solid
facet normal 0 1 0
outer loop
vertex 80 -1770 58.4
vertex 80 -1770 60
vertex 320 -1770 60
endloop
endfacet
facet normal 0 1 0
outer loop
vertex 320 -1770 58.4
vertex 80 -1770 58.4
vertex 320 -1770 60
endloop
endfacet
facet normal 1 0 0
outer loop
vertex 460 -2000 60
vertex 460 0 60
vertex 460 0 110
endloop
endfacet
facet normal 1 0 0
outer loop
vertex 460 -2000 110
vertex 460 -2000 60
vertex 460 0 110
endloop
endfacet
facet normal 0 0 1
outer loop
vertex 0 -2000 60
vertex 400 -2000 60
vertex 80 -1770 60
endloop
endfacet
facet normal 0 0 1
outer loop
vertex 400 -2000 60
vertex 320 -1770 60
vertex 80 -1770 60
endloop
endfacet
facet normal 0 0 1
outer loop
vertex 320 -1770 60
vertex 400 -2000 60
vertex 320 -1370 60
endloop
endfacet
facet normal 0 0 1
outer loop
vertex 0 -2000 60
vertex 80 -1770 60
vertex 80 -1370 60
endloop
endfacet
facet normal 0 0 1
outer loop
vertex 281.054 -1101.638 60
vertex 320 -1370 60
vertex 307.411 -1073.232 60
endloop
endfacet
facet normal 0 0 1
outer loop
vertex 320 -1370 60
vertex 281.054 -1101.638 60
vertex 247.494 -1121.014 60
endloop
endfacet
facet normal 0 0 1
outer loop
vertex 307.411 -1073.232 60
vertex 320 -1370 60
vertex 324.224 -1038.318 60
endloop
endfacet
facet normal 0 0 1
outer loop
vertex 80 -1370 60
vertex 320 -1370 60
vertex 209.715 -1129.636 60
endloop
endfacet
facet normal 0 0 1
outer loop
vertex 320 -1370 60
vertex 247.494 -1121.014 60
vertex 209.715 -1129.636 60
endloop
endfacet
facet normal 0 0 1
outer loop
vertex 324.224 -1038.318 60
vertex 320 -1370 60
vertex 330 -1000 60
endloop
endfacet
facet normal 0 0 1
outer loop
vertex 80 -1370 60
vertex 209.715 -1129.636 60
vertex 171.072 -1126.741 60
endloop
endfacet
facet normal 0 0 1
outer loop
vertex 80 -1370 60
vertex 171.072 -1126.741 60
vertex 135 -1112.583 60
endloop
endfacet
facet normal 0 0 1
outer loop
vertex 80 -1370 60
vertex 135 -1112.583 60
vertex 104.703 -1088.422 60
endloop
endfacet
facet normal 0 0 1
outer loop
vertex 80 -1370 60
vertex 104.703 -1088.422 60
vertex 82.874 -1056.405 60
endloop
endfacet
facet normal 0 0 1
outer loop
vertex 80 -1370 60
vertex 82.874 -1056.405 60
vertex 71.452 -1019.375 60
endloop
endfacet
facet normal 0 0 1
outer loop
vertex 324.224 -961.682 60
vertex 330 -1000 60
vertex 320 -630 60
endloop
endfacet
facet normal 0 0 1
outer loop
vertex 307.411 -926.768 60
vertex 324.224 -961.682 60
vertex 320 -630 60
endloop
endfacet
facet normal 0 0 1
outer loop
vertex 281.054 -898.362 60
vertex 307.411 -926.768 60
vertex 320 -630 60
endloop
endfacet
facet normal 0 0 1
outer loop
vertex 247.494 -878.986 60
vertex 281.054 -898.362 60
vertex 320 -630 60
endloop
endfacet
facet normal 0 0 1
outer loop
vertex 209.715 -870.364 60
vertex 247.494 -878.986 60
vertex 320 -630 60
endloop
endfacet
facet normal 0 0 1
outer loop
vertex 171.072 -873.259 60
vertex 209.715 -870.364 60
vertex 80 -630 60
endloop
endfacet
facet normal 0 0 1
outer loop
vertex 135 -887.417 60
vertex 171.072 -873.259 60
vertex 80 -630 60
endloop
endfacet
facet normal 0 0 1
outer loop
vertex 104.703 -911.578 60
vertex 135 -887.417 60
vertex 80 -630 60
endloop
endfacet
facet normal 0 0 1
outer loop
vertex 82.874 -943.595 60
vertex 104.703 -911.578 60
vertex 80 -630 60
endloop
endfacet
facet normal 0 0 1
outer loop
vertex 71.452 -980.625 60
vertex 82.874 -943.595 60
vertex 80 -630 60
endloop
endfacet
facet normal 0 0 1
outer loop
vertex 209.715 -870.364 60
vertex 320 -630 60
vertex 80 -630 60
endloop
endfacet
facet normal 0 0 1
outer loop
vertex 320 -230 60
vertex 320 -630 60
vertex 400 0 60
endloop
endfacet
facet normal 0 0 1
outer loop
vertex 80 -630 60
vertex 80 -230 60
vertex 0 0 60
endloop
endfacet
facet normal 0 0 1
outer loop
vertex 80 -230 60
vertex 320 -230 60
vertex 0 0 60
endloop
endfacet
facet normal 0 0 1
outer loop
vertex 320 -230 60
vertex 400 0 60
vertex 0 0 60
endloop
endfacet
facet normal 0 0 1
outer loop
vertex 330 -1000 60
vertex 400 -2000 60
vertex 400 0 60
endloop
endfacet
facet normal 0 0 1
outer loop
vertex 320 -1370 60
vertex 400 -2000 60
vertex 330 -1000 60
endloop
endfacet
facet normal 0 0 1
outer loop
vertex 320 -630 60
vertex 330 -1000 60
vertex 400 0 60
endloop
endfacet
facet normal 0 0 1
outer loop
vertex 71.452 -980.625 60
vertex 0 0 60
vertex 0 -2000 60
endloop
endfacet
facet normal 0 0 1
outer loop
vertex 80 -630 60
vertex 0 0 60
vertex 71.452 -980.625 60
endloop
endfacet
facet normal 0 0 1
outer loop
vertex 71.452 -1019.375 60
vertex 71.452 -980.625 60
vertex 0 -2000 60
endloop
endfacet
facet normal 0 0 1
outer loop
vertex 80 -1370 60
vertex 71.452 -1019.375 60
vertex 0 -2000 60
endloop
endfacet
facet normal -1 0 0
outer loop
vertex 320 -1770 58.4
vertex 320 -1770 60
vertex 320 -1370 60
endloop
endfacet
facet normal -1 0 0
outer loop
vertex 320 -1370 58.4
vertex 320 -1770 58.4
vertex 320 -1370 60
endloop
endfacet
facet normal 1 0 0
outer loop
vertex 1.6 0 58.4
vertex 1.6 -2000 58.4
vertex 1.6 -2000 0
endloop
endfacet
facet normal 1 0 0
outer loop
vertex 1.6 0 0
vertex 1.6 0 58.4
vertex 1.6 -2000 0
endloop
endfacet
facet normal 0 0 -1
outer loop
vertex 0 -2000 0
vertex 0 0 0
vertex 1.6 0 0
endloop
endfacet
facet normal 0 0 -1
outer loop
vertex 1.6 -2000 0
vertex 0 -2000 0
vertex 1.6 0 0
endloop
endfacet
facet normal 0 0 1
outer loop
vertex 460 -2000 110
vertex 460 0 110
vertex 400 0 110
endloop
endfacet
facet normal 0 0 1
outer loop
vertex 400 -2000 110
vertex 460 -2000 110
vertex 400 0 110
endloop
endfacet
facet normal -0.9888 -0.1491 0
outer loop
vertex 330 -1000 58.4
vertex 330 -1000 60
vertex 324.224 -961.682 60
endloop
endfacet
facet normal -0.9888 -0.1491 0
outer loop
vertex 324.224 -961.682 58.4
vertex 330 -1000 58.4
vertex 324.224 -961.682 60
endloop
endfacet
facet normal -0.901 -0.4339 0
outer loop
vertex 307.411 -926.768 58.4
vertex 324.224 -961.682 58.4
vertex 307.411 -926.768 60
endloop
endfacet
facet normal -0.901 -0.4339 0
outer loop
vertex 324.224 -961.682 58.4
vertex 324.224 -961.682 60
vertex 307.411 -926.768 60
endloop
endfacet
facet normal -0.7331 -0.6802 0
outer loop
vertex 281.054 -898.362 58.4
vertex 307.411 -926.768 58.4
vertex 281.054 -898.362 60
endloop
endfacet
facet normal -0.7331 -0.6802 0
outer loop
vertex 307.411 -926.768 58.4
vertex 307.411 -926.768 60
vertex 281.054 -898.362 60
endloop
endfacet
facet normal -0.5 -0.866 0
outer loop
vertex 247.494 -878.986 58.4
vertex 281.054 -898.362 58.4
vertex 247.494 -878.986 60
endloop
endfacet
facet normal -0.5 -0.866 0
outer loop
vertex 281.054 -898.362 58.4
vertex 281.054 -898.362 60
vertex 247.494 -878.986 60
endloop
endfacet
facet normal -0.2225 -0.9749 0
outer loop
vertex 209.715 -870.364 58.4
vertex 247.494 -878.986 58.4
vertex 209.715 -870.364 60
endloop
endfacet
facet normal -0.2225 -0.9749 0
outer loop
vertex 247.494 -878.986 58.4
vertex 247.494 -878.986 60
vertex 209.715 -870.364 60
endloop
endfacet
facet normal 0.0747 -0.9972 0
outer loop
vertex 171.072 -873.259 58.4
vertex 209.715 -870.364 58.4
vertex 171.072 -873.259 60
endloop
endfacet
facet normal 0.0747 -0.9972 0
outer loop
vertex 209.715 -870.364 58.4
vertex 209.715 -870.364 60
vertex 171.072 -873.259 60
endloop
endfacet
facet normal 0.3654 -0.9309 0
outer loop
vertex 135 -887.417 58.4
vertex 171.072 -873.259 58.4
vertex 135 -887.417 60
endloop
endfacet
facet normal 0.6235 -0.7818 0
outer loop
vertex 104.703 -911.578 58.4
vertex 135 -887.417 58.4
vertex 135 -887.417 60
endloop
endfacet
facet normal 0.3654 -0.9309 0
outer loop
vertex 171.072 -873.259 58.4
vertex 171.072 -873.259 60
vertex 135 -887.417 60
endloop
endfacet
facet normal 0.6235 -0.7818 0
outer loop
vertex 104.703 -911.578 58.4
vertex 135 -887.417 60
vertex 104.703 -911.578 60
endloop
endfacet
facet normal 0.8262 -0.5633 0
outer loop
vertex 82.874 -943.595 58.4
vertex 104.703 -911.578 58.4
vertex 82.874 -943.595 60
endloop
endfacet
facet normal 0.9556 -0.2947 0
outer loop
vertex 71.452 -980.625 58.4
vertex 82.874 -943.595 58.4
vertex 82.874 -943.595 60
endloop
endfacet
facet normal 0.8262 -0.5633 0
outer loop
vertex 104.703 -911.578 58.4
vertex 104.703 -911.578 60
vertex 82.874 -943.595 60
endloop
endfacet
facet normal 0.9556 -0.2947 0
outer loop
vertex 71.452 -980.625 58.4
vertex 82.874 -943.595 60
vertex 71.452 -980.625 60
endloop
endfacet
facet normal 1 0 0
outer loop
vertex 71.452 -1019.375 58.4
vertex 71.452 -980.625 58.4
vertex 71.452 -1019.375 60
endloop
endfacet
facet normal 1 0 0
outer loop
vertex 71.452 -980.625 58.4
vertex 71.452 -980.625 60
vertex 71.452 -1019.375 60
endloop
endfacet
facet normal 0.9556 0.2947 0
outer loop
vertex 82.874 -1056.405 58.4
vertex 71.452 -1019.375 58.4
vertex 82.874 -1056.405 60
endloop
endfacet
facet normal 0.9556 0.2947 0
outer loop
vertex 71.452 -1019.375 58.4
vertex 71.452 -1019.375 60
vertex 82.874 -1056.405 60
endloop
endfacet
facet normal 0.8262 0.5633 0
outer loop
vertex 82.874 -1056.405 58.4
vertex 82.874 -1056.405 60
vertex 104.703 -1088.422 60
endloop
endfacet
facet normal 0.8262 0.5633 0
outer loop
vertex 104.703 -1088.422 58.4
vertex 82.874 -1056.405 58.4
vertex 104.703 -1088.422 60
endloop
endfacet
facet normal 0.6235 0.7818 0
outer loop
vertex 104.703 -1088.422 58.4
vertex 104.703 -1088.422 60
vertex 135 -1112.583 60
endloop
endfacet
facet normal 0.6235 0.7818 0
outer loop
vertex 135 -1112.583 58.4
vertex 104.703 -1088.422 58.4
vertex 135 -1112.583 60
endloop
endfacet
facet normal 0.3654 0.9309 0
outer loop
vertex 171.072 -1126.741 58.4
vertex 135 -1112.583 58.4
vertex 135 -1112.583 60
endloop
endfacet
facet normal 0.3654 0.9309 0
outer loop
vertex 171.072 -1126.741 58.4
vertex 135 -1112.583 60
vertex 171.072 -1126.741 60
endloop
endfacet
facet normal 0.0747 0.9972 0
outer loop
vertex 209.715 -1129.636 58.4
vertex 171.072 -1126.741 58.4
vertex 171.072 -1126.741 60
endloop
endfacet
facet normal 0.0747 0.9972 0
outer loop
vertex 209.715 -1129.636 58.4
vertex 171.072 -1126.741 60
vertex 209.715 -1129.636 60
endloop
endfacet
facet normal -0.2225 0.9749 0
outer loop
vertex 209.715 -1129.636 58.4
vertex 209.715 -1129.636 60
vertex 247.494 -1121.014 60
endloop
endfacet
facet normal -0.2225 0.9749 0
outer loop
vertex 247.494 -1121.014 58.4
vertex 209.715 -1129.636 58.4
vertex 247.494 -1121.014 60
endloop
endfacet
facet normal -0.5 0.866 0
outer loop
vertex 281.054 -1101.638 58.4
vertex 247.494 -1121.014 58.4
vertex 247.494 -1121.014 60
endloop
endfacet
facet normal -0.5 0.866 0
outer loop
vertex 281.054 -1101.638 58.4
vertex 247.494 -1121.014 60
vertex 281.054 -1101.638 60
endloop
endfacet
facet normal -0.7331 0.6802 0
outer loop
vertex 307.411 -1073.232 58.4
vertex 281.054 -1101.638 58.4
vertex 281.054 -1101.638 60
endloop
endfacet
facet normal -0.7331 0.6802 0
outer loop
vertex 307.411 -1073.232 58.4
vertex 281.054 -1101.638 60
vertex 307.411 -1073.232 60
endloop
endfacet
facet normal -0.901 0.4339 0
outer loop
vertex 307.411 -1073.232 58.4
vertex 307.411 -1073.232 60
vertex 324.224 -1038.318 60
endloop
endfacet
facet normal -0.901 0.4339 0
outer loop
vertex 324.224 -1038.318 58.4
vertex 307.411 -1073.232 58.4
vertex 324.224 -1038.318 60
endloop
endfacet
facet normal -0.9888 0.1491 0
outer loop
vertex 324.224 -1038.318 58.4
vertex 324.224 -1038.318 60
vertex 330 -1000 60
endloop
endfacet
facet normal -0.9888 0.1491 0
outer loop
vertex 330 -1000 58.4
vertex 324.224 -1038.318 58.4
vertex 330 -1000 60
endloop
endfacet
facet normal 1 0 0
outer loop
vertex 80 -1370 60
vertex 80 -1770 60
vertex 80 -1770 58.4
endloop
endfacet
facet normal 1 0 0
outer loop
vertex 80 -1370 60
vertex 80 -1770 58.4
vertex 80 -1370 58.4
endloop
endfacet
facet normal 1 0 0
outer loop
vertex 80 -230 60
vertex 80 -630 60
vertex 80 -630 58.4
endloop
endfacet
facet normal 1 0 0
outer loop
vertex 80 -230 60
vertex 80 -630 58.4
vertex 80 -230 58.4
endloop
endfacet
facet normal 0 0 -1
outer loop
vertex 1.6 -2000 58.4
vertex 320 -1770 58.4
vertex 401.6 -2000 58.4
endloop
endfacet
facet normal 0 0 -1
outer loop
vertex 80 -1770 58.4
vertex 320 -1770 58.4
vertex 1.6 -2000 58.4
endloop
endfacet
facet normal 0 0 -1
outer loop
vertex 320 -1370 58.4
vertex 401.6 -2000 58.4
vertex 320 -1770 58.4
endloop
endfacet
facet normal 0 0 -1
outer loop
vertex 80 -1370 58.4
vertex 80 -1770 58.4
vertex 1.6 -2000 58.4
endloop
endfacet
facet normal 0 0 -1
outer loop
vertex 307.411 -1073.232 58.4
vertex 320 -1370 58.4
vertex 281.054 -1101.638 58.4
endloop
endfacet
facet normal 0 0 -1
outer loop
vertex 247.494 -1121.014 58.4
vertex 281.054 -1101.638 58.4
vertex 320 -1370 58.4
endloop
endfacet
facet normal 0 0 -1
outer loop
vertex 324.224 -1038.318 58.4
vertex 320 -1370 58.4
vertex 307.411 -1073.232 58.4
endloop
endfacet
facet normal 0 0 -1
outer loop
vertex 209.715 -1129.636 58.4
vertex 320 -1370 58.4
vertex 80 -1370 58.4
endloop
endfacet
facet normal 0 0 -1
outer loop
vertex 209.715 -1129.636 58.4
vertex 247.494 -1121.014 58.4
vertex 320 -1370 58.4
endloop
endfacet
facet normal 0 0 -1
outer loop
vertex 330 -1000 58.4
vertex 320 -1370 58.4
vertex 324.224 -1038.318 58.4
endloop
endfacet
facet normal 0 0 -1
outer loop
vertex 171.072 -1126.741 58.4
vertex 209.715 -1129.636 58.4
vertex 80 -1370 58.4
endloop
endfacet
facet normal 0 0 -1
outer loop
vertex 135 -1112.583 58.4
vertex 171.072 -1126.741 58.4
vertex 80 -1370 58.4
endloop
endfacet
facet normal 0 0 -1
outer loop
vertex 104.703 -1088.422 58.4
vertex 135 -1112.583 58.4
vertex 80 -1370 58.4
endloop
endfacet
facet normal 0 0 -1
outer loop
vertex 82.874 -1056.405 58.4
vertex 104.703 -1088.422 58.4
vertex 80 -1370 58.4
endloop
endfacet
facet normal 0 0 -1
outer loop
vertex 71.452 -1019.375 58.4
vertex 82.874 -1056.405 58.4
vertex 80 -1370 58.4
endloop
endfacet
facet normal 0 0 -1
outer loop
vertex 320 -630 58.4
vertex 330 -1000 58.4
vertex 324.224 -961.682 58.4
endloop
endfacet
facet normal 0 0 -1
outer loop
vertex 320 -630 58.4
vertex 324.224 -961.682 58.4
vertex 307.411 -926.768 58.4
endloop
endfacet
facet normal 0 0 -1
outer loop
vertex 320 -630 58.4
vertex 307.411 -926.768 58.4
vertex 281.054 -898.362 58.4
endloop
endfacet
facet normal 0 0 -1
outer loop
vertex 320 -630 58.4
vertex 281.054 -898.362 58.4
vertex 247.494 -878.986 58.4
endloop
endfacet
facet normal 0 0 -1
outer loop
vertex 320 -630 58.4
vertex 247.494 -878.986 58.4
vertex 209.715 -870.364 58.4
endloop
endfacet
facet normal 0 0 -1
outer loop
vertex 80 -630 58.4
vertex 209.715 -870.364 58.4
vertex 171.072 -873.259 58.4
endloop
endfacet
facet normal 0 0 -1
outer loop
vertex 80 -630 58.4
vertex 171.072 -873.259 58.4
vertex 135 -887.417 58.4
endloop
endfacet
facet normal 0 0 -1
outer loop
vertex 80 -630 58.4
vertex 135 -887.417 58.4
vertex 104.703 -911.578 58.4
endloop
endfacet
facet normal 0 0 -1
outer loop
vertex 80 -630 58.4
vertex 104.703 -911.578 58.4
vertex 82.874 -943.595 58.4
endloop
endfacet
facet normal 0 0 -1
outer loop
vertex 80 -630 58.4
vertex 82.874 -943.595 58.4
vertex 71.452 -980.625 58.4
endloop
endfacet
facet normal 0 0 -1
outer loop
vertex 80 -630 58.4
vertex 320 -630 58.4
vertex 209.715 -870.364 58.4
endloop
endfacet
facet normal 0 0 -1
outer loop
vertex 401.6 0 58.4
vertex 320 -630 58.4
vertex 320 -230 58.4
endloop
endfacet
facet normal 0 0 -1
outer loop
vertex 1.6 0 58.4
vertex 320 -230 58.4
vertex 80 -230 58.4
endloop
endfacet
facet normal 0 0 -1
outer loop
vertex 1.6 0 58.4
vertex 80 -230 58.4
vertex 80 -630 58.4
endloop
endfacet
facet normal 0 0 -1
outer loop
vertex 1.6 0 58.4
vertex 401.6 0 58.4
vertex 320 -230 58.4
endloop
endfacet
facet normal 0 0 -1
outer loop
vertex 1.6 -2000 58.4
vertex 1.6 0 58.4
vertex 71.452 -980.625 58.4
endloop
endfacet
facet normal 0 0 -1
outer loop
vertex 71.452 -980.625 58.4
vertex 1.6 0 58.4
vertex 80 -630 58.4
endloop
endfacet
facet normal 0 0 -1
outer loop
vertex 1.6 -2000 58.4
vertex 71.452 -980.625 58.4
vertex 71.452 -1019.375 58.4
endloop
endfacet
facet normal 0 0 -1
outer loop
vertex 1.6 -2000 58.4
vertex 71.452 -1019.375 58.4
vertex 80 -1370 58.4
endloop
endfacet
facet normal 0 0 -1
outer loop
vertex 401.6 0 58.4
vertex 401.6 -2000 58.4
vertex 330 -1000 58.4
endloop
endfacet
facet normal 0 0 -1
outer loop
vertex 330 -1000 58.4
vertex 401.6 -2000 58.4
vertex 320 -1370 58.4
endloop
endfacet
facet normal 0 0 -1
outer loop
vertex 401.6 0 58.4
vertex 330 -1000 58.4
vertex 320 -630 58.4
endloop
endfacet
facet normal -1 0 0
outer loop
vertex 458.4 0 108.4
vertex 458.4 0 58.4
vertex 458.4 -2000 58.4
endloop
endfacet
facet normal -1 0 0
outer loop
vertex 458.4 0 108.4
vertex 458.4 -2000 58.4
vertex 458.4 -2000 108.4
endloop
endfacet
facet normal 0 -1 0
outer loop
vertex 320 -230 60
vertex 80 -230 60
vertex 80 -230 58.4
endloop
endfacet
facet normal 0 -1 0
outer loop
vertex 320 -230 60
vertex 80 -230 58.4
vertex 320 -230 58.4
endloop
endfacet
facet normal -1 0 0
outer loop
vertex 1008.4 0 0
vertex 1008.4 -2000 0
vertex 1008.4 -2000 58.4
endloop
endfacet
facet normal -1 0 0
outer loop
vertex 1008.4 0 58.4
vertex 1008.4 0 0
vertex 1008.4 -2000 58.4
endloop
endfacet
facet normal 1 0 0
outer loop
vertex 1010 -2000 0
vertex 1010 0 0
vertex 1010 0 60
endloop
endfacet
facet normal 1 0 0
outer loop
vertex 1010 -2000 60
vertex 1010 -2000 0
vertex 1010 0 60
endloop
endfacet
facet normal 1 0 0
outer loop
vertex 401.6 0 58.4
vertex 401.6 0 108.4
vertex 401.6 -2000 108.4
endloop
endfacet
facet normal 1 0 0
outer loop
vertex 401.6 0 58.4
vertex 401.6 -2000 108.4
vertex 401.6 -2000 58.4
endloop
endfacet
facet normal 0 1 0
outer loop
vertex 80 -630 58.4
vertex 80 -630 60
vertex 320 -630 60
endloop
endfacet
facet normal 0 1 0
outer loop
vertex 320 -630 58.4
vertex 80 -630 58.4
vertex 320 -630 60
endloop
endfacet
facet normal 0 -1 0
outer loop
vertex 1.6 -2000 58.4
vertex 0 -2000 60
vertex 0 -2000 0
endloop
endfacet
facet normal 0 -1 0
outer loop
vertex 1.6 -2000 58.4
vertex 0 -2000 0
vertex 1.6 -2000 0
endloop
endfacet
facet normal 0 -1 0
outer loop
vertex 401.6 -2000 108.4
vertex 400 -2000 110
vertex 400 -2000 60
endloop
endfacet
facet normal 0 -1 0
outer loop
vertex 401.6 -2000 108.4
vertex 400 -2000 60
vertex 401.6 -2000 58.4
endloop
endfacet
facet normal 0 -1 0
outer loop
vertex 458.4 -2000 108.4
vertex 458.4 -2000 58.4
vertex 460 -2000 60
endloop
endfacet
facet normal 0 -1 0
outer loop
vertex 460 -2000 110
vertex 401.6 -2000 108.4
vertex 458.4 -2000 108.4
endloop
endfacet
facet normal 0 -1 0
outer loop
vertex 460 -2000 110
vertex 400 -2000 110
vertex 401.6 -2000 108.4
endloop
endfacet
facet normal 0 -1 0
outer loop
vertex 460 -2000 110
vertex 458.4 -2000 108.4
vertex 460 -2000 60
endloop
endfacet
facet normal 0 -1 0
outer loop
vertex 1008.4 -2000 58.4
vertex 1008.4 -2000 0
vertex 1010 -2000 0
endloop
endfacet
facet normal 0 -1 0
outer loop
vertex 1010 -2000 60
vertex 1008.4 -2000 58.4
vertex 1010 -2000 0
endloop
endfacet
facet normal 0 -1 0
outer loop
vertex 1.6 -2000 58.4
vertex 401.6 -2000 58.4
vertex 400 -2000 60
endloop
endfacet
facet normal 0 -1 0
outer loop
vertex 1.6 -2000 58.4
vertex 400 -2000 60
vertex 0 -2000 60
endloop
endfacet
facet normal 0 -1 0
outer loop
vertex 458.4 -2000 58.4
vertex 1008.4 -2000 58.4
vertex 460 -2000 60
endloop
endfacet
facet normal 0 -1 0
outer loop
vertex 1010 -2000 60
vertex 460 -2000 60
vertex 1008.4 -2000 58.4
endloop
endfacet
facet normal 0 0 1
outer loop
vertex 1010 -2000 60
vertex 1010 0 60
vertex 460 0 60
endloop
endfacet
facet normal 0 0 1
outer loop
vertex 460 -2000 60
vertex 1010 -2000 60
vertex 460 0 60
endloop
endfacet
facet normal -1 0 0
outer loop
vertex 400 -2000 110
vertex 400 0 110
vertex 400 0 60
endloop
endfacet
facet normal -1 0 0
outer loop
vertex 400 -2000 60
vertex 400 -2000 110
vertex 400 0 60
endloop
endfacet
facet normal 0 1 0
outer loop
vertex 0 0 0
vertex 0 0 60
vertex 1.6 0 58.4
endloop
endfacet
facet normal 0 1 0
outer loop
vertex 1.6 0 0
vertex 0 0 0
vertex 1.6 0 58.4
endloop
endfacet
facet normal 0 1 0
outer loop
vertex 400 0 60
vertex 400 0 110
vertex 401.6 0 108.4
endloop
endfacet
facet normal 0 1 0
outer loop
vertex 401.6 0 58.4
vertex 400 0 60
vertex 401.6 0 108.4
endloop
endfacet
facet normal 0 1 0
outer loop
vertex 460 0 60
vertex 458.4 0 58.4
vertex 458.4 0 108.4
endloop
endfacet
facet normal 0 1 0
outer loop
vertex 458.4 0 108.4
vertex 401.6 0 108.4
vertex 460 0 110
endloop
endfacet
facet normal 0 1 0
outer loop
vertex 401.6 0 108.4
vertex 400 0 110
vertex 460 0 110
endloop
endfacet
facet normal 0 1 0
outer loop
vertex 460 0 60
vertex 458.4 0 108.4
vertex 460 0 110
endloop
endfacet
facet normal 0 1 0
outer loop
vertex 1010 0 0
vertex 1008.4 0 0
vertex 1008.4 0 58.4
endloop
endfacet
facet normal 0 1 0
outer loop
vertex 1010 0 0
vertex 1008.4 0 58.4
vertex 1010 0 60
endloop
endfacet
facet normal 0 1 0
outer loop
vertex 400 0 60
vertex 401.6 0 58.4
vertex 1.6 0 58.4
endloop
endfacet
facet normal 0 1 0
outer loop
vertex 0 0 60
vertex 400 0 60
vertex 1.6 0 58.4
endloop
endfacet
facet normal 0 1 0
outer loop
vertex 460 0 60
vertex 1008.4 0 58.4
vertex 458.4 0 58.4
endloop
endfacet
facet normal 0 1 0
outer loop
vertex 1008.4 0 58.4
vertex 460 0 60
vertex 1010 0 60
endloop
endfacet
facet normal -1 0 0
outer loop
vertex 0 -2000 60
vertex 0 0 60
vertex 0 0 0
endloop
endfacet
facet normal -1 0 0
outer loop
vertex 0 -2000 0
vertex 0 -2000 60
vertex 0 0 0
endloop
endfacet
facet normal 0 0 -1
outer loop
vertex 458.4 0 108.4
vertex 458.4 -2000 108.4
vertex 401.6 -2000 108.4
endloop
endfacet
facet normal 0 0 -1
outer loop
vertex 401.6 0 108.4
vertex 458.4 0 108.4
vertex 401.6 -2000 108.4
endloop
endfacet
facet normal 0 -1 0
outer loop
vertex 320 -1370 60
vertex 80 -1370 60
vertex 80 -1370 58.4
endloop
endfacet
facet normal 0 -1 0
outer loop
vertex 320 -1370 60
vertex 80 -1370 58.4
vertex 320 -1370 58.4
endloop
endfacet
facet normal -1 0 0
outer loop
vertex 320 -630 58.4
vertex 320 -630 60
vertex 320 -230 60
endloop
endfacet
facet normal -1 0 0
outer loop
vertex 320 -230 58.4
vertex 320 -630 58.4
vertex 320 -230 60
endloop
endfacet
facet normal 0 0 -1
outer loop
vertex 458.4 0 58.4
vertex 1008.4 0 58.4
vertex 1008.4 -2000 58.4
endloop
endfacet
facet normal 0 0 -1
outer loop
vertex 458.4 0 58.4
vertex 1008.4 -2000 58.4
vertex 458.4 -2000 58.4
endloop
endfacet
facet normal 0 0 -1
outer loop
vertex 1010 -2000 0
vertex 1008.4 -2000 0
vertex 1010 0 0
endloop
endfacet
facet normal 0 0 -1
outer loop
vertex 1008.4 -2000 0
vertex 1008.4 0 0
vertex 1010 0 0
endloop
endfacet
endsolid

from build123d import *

# Parameters (mm, degrees)
F1_DEPTH = 2000
F2_T     = -1.6
F3_R     = 130
F3_W     = 240
F3_H     = 400
F4_DEPTH = 60.001


with BuildPart() as f1:
    # F0 (on Front) → F1 (new body)
    with BuildSketch(Plane.XZ):
        Polygon((0, 60), (0, 0), (1010, 0), (1010, 60), (460, 60), (460, 110), (400, 110), (400, 60), align=None)
    extrude(amount=F1_DEPTH)

    # F2
    f2_openings = [f1.faces().sort_by_distance(p)[0] for p in [
        (505, -1000, 0),
        (501.462264, -2000, 32.59434),
        (501.462264, 0, 32.59434),
    ]]
    offset(amount=F2_T, openings=f2_openings, kind=Kind.INTERSECTION)

    # F3 (on face) → F4 (cut, through all)
    with BuildSketch(Plane.XY.offset(60)):
        with Locations((200, -1000)):
            Circle(F3_R)
        with Locations((200, -430)):
            Rectangle(F3_W, F3_H)
        with Locations((200, -1570)):
            Rectangle(F3_W, F3_H)
    extrude(amount=-F4_DEPTH, mode=Mode.SUBTRACT)


solid = f1.part
